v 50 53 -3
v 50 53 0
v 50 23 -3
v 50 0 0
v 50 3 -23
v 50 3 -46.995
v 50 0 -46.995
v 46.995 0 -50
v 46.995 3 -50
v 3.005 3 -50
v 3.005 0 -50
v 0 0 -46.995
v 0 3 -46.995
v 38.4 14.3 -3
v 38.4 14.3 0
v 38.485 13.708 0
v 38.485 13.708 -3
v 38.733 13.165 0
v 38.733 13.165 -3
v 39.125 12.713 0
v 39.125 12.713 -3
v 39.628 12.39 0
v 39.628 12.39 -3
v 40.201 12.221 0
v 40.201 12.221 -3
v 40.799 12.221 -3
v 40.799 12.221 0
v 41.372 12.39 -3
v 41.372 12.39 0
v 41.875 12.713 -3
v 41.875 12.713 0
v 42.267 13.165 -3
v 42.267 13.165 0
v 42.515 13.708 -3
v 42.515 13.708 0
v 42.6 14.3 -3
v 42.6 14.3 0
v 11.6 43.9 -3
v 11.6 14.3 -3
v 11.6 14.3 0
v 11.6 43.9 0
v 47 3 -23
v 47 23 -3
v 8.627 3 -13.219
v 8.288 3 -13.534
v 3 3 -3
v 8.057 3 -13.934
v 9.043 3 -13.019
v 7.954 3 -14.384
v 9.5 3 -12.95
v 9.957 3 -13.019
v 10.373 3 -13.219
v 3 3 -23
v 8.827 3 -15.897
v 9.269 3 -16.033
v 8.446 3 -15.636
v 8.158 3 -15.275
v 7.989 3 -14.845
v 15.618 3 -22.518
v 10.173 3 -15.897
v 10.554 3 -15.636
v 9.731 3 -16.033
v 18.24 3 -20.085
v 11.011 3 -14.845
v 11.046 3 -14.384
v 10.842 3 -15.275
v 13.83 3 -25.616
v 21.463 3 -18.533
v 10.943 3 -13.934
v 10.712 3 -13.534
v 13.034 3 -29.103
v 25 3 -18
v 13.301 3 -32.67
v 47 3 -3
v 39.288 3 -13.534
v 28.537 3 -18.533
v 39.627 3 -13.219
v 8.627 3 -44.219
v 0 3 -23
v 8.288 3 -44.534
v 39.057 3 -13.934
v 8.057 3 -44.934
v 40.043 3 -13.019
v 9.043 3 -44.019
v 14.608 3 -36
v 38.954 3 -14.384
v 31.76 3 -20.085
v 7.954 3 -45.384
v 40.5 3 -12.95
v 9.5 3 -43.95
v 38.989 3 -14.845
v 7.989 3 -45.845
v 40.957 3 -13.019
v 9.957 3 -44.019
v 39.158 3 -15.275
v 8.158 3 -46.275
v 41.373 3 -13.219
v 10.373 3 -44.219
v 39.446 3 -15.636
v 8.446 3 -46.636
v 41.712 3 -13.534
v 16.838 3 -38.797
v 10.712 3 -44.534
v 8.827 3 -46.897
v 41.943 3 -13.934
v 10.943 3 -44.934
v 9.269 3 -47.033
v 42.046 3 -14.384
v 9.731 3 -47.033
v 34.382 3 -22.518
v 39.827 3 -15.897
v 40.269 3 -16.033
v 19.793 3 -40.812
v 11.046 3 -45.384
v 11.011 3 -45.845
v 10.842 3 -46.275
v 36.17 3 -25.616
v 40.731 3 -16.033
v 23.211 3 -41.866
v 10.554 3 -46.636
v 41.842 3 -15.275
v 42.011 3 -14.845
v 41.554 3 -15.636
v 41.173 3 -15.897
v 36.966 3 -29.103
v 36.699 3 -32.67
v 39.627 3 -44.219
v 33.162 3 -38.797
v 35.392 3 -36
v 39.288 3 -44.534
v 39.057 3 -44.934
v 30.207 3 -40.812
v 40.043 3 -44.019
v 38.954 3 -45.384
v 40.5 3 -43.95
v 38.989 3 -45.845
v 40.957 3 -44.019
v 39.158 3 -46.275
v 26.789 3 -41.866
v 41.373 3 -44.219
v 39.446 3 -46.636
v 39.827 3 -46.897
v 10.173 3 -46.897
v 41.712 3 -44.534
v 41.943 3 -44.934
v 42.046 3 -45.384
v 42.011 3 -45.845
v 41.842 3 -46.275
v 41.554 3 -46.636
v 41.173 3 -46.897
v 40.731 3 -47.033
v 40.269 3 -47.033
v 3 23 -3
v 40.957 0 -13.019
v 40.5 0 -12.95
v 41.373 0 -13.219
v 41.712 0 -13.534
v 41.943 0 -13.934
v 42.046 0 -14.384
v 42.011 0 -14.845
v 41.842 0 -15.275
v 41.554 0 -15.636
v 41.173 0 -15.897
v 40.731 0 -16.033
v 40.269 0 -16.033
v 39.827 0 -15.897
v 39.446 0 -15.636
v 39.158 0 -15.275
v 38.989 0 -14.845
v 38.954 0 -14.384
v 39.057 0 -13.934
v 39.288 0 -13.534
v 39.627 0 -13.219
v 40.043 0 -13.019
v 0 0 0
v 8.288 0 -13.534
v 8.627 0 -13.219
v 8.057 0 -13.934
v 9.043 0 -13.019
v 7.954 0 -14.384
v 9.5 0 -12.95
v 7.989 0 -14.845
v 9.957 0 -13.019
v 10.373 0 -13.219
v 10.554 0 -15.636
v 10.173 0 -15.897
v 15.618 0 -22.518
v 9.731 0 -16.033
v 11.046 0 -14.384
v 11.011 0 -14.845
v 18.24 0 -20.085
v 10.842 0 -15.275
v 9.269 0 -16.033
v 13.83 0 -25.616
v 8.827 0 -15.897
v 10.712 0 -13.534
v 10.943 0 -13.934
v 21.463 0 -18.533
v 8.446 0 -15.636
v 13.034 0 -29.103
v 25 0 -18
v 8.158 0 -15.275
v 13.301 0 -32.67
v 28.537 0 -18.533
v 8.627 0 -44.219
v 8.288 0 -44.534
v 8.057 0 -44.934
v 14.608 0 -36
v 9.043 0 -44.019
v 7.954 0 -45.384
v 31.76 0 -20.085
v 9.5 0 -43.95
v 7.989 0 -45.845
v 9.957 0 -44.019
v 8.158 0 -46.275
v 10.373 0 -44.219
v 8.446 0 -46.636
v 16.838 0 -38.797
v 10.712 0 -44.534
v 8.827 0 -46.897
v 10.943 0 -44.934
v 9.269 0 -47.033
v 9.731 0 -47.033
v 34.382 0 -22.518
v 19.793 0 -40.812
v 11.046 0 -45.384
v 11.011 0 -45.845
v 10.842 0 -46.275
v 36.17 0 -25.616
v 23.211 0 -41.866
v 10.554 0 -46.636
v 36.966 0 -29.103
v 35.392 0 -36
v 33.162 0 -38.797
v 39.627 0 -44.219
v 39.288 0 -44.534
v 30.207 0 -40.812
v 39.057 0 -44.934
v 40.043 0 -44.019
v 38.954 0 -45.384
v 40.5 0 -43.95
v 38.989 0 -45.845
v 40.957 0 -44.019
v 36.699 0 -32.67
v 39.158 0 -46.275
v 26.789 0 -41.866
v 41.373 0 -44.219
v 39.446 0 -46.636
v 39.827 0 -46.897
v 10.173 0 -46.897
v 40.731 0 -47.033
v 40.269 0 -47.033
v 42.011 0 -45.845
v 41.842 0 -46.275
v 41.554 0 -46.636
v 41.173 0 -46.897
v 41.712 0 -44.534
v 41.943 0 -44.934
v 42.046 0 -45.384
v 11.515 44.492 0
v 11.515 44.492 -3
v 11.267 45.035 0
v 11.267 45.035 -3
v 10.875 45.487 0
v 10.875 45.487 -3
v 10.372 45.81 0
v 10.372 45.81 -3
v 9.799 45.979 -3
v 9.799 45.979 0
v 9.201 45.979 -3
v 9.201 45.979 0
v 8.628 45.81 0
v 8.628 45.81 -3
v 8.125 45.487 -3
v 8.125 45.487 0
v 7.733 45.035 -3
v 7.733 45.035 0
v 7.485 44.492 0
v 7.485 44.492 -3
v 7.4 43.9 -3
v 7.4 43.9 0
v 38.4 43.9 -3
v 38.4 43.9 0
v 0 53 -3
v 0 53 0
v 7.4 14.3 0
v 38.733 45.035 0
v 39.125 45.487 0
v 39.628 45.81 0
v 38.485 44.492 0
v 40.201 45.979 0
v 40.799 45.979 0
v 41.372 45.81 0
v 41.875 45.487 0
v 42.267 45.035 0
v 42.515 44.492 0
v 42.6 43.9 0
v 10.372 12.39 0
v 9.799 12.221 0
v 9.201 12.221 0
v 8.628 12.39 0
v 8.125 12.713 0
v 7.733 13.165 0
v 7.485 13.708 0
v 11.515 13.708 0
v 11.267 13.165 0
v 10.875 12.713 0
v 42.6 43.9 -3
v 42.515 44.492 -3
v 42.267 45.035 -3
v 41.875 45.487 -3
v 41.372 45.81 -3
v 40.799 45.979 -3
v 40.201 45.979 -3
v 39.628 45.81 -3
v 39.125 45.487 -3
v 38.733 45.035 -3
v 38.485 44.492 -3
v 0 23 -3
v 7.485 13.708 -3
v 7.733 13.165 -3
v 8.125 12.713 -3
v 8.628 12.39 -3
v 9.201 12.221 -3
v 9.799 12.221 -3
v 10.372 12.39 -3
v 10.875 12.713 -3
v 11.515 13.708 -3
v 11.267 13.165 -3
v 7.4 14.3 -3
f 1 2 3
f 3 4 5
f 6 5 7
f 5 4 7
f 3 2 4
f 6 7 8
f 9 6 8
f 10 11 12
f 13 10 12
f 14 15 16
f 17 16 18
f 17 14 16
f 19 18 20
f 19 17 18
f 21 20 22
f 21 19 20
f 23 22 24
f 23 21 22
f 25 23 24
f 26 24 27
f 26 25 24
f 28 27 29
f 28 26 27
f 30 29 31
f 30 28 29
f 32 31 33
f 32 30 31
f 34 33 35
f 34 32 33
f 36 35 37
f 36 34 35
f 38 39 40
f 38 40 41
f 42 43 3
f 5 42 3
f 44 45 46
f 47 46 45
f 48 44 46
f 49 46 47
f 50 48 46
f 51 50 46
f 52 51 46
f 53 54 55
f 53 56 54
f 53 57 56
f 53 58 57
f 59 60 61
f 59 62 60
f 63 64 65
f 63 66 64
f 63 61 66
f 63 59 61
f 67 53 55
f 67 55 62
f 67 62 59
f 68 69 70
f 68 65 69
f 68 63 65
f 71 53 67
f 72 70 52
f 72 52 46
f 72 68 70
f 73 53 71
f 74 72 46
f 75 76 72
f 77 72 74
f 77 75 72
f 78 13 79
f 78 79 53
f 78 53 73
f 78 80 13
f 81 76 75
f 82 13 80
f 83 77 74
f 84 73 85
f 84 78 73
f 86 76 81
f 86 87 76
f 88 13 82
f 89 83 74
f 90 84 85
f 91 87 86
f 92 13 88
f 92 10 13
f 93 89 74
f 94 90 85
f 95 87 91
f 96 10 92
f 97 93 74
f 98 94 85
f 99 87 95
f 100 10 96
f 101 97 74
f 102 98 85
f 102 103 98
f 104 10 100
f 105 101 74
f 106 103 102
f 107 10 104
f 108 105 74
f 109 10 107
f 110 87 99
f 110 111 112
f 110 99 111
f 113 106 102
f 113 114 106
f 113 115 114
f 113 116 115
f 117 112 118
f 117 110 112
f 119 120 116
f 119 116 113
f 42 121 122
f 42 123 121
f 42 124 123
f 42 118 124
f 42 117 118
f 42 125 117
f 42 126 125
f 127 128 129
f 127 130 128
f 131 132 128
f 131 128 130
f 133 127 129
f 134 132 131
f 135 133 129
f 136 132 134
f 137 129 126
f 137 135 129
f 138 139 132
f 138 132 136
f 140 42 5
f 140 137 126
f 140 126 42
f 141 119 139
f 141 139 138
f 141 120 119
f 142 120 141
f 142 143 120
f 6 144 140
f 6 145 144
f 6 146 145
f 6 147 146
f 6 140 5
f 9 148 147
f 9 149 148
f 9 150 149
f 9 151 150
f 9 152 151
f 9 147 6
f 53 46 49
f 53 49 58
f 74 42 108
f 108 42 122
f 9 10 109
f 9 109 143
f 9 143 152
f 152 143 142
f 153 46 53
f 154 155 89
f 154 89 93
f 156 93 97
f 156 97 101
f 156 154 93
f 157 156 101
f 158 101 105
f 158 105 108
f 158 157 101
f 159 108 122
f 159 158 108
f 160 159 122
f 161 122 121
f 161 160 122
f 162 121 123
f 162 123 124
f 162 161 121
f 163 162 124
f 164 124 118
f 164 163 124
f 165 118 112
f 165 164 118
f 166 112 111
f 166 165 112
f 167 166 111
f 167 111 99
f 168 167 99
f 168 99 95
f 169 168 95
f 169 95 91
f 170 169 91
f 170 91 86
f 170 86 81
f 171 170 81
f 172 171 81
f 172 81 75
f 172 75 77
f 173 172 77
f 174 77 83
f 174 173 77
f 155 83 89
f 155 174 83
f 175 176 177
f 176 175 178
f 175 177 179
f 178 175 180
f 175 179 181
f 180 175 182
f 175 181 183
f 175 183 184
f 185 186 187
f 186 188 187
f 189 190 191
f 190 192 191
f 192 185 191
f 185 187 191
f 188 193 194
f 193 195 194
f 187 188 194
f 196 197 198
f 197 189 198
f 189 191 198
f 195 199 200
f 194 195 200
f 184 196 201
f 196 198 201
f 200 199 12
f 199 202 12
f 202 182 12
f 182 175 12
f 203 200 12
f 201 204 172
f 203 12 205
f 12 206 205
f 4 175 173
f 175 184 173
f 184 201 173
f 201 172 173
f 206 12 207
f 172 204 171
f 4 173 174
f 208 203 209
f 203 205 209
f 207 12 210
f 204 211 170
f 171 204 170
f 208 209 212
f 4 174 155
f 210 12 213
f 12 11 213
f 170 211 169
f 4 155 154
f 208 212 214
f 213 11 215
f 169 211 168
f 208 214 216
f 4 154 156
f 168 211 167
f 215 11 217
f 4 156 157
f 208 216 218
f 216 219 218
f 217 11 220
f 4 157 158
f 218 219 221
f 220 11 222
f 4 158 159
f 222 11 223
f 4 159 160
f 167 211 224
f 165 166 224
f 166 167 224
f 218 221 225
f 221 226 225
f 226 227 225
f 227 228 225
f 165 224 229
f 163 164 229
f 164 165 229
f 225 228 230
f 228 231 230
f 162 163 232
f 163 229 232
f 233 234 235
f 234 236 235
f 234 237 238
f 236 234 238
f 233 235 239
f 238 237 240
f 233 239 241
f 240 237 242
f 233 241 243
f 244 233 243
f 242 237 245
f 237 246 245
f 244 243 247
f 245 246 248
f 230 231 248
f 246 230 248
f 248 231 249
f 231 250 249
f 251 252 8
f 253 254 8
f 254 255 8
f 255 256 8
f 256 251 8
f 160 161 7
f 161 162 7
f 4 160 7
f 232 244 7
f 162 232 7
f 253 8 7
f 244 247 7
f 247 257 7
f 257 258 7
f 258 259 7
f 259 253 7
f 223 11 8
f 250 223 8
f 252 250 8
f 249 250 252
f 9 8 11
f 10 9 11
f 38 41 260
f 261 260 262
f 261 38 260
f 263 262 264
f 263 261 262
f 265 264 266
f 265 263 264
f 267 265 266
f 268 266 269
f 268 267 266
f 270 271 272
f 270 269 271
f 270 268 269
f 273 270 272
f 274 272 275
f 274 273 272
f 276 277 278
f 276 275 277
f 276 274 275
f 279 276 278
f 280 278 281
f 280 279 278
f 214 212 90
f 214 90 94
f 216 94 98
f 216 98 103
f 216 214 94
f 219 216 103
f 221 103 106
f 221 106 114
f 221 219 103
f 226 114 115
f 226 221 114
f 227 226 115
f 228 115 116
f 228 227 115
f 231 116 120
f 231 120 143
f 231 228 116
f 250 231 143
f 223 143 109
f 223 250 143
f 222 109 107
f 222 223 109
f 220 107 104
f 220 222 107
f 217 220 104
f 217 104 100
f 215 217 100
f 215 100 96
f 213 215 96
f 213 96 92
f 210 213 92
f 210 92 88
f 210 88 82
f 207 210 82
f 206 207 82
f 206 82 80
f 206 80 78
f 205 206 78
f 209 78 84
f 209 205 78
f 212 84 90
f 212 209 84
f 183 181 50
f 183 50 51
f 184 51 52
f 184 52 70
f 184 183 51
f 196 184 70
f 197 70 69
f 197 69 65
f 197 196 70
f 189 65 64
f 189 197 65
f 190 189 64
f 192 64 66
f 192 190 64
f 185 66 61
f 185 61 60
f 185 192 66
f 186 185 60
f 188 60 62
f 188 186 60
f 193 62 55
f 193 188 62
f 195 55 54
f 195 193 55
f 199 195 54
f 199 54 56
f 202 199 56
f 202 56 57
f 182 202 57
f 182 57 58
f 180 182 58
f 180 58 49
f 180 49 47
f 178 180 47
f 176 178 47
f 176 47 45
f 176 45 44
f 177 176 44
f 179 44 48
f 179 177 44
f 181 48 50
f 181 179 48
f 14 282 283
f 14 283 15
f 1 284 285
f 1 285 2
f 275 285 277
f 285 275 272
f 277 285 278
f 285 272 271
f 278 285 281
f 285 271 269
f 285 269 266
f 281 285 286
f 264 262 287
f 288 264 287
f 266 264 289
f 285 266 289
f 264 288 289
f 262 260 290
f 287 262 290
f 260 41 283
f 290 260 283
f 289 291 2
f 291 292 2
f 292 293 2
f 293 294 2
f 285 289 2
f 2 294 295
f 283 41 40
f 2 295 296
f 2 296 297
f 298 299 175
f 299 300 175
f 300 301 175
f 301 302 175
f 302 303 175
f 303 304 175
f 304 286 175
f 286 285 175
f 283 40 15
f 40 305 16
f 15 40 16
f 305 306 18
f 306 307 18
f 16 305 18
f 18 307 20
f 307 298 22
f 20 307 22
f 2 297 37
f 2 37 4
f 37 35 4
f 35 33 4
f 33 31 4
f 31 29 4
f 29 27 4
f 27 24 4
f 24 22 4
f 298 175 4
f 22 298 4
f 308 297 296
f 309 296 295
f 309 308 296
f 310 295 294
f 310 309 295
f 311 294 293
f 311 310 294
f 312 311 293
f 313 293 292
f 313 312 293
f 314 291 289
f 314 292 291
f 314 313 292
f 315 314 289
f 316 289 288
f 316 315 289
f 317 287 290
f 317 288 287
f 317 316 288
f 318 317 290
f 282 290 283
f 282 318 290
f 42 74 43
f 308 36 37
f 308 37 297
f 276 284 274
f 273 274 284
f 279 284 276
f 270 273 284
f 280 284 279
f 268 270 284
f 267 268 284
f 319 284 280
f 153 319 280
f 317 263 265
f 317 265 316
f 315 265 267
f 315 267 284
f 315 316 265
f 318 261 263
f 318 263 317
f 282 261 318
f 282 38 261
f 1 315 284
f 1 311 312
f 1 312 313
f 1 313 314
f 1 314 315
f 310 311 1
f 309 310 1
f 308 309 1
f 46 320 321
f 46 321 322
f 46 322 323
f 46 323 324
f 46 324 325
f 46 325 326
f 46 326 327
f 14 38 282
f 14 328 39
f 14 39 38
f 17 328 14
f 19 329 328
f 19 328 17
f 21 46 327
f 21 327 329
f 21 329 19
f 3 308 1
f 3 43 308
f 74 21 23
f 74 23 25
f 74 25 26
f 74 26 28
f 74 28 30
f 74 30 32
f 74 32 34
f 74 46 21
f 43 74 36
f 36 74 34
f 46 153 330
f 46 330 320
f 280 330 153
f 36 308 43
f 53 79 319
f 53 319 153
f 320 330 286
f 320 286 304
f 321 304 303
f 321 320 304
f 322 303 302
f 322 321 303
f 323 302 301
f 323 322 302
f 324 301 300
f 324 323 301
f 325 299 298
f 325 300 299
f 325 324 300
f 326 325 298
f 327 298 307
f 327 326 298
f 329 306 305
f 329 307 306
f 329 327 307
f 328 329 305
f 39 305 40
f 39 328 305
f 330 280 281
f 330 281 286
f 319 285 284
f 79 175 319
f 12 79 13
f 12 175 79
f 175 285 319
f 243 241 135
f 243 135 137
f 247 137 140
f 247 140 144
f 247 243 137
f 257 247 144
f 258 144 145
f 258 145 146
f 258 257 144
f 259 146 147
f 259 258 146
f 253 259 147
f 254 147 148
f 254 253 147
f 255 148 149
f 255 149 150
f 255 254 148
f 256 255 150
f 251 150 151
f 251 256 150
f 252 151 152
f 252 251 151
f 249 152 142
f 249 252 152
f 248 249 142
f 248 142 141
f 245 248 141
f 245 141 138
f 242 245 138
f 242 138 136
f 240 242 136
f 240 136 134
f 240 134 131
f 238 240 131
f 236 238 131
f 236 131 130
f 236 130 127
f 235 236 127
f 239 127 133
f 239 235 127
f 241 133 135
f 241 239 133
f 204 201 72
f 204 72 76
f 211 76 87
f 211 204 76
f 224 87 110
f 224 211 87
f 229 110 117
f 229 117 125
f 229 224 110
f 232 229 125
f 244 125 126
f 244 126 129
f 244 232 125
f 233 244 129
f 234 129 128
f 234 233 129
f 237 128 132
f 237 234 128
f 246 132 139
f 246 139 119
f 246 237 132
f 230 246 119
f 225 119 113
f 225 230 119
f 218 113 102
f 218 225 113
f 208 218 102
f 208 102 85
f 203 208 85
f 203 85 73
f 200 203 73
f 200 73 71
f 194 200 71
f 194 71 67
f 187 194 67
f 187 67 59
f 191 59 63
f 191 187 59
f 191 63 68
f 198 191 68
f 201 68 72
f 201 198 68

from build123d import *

# Parameters (mm, degrees)
BASESKETCH1_R             = 12
BASESKETCH1_R_2           = 1.55
WIDTHBOSS_EXTRUDE1_DEPTH  = 3
SKETCH2_W                 = 50
SKETCH2_H                 = 3
HEIGHTBOSS_EXTRUDE2_DEPTH = 50
SLOTSCUT_EXTRUDE1_DEPTH   = 87.706401148
WEDGESKETCH4_W            = 3
WEDGESKETCH4_H            = 20
ANGLEBOSS_EXTRUDE3_DEPTH  = 20
CHAMFER1_SIZE             = 20


with BuildPart() as part:
    # BaseSketch1 → WidthBoss-Extrude1 (new body)
    with BuildSketch(Plane(origin=(0, 0, 0), x_dir=(1, 0, 0), z_dir=(0, 1, 0))):
        Polygon((0, 0), (50, 0), (50, 46.99479618), (46.99479618, 50), (3.00520382, 50), (0, 46.99479618), align=None)
        with Locations(Location((25, 30, 0), (0, 0, 270))):
            Circle(BASESKETCH1_R, mode=Mode.SUBTRACT)
        with Locations(Location((9.5, 45.5, 0), (0, 0, 270))):
            Circle(BASESKETCH1_R_2, mode=Mode.SUBTRACT)
        with Locations(Location((40.5, 45.5, 0), (0, 0, 270))):
            Circle(BASESKETCH1_R_2, mode=Mode.SUBTRACT)
        with Locations(Location((40.5, 14.5, 0), (0, 0, 270))):
            Circle(BASESKETCH1_R_2, mode=Mode.SUBTRACT)
        with Locations(Location((9.5, 14.5, 0), (0, 0, 270))):
            Circle(BASESKETCH1_R_2, mode=Mode.SUBTRACT)
    extrude(amount=WIDTHBOSS_EXTRUDE1_DEPTH)

    # Sketch2 → HeightBoss-Extrude2 (add)
    with BuildSketch(Plane(origin=(0, 3, 0), x_dir=(1, 0, 0), z_dir=(0, 1, 0))):
        with Locations((25, 1.5)):
            Rectangle(SKETCH2_W, SKETCH2_H)
    extrude(amount=HEIGHTBOSS_EXTRUDE2_DEPTH)

    # Sketch3 → SlotsCut-Extrude1 (cut, through all)
    with BuildSketch(Plane(origin=(0, 0, -3), x_dir=(-1, 0, 0), z_dir=(0, 0, -1))):
        with BuildLine():
            Line((-42.6, 14.3), (-42.6, 43.9))
            ThreePointArc((-42.6, 43.9), (-40.5, 46), (-38.4, 43.9))
            Line((-38.4, 43.9), (-38.4, 14.3))
            ThreePointArc((-38.4, 14.3), (-40.5, 12.2), (-42.6, 14.3))
        make_face()
        with BuildLine():
            Line((-11.6, 14.3), (-11.6, 43.9))
            ThreePointArc((-11.6, 43.9), (-9.5, 46), (-7.4, 43.9))
            Line((-7.4, 43.9), (-7.4, 14.3))
            ThreePointArc((-7.4, 14.3), (-9.5, 12.2), (-11.6, 14.3))
        make_face()
    extrude(amount=-SLOTSCUT_EXTRUDE1_DEPTH, mode=Mode.SUBTRACT)

    # WedgeSketch4 → AngleBoss-Extrude3 (add)
    with BuildSketch(Plane(origin=(0, 3, 0), x_dir=(1, 0, 0), z_dir=(0, 1, 0))):
        with Locations((48.5, 13)):
            Rectangle(WEDGESKETCH4_W, WEDGESKETCH4_H)
        with Locations((1.5, 13)):
            Rectangle(WEDGESKETCH4_W, WEDGESKETCH4_H)
    extrude(amount=ANGLEBOSS_EXTRUDE3_DEPTH)

    # Chamfer1
    chamfer1_edges = [part.edges().sort_by_distance(p)[0] for p in [
        (48.5, 23, -23),
        (1.5, 23, -23),
    ]]
    chamfer(chamfer1_edges, length=CHAMFER1_SIZE - 0.0001)  # a hair under: the kernel refuses the full size


solid = part.part
